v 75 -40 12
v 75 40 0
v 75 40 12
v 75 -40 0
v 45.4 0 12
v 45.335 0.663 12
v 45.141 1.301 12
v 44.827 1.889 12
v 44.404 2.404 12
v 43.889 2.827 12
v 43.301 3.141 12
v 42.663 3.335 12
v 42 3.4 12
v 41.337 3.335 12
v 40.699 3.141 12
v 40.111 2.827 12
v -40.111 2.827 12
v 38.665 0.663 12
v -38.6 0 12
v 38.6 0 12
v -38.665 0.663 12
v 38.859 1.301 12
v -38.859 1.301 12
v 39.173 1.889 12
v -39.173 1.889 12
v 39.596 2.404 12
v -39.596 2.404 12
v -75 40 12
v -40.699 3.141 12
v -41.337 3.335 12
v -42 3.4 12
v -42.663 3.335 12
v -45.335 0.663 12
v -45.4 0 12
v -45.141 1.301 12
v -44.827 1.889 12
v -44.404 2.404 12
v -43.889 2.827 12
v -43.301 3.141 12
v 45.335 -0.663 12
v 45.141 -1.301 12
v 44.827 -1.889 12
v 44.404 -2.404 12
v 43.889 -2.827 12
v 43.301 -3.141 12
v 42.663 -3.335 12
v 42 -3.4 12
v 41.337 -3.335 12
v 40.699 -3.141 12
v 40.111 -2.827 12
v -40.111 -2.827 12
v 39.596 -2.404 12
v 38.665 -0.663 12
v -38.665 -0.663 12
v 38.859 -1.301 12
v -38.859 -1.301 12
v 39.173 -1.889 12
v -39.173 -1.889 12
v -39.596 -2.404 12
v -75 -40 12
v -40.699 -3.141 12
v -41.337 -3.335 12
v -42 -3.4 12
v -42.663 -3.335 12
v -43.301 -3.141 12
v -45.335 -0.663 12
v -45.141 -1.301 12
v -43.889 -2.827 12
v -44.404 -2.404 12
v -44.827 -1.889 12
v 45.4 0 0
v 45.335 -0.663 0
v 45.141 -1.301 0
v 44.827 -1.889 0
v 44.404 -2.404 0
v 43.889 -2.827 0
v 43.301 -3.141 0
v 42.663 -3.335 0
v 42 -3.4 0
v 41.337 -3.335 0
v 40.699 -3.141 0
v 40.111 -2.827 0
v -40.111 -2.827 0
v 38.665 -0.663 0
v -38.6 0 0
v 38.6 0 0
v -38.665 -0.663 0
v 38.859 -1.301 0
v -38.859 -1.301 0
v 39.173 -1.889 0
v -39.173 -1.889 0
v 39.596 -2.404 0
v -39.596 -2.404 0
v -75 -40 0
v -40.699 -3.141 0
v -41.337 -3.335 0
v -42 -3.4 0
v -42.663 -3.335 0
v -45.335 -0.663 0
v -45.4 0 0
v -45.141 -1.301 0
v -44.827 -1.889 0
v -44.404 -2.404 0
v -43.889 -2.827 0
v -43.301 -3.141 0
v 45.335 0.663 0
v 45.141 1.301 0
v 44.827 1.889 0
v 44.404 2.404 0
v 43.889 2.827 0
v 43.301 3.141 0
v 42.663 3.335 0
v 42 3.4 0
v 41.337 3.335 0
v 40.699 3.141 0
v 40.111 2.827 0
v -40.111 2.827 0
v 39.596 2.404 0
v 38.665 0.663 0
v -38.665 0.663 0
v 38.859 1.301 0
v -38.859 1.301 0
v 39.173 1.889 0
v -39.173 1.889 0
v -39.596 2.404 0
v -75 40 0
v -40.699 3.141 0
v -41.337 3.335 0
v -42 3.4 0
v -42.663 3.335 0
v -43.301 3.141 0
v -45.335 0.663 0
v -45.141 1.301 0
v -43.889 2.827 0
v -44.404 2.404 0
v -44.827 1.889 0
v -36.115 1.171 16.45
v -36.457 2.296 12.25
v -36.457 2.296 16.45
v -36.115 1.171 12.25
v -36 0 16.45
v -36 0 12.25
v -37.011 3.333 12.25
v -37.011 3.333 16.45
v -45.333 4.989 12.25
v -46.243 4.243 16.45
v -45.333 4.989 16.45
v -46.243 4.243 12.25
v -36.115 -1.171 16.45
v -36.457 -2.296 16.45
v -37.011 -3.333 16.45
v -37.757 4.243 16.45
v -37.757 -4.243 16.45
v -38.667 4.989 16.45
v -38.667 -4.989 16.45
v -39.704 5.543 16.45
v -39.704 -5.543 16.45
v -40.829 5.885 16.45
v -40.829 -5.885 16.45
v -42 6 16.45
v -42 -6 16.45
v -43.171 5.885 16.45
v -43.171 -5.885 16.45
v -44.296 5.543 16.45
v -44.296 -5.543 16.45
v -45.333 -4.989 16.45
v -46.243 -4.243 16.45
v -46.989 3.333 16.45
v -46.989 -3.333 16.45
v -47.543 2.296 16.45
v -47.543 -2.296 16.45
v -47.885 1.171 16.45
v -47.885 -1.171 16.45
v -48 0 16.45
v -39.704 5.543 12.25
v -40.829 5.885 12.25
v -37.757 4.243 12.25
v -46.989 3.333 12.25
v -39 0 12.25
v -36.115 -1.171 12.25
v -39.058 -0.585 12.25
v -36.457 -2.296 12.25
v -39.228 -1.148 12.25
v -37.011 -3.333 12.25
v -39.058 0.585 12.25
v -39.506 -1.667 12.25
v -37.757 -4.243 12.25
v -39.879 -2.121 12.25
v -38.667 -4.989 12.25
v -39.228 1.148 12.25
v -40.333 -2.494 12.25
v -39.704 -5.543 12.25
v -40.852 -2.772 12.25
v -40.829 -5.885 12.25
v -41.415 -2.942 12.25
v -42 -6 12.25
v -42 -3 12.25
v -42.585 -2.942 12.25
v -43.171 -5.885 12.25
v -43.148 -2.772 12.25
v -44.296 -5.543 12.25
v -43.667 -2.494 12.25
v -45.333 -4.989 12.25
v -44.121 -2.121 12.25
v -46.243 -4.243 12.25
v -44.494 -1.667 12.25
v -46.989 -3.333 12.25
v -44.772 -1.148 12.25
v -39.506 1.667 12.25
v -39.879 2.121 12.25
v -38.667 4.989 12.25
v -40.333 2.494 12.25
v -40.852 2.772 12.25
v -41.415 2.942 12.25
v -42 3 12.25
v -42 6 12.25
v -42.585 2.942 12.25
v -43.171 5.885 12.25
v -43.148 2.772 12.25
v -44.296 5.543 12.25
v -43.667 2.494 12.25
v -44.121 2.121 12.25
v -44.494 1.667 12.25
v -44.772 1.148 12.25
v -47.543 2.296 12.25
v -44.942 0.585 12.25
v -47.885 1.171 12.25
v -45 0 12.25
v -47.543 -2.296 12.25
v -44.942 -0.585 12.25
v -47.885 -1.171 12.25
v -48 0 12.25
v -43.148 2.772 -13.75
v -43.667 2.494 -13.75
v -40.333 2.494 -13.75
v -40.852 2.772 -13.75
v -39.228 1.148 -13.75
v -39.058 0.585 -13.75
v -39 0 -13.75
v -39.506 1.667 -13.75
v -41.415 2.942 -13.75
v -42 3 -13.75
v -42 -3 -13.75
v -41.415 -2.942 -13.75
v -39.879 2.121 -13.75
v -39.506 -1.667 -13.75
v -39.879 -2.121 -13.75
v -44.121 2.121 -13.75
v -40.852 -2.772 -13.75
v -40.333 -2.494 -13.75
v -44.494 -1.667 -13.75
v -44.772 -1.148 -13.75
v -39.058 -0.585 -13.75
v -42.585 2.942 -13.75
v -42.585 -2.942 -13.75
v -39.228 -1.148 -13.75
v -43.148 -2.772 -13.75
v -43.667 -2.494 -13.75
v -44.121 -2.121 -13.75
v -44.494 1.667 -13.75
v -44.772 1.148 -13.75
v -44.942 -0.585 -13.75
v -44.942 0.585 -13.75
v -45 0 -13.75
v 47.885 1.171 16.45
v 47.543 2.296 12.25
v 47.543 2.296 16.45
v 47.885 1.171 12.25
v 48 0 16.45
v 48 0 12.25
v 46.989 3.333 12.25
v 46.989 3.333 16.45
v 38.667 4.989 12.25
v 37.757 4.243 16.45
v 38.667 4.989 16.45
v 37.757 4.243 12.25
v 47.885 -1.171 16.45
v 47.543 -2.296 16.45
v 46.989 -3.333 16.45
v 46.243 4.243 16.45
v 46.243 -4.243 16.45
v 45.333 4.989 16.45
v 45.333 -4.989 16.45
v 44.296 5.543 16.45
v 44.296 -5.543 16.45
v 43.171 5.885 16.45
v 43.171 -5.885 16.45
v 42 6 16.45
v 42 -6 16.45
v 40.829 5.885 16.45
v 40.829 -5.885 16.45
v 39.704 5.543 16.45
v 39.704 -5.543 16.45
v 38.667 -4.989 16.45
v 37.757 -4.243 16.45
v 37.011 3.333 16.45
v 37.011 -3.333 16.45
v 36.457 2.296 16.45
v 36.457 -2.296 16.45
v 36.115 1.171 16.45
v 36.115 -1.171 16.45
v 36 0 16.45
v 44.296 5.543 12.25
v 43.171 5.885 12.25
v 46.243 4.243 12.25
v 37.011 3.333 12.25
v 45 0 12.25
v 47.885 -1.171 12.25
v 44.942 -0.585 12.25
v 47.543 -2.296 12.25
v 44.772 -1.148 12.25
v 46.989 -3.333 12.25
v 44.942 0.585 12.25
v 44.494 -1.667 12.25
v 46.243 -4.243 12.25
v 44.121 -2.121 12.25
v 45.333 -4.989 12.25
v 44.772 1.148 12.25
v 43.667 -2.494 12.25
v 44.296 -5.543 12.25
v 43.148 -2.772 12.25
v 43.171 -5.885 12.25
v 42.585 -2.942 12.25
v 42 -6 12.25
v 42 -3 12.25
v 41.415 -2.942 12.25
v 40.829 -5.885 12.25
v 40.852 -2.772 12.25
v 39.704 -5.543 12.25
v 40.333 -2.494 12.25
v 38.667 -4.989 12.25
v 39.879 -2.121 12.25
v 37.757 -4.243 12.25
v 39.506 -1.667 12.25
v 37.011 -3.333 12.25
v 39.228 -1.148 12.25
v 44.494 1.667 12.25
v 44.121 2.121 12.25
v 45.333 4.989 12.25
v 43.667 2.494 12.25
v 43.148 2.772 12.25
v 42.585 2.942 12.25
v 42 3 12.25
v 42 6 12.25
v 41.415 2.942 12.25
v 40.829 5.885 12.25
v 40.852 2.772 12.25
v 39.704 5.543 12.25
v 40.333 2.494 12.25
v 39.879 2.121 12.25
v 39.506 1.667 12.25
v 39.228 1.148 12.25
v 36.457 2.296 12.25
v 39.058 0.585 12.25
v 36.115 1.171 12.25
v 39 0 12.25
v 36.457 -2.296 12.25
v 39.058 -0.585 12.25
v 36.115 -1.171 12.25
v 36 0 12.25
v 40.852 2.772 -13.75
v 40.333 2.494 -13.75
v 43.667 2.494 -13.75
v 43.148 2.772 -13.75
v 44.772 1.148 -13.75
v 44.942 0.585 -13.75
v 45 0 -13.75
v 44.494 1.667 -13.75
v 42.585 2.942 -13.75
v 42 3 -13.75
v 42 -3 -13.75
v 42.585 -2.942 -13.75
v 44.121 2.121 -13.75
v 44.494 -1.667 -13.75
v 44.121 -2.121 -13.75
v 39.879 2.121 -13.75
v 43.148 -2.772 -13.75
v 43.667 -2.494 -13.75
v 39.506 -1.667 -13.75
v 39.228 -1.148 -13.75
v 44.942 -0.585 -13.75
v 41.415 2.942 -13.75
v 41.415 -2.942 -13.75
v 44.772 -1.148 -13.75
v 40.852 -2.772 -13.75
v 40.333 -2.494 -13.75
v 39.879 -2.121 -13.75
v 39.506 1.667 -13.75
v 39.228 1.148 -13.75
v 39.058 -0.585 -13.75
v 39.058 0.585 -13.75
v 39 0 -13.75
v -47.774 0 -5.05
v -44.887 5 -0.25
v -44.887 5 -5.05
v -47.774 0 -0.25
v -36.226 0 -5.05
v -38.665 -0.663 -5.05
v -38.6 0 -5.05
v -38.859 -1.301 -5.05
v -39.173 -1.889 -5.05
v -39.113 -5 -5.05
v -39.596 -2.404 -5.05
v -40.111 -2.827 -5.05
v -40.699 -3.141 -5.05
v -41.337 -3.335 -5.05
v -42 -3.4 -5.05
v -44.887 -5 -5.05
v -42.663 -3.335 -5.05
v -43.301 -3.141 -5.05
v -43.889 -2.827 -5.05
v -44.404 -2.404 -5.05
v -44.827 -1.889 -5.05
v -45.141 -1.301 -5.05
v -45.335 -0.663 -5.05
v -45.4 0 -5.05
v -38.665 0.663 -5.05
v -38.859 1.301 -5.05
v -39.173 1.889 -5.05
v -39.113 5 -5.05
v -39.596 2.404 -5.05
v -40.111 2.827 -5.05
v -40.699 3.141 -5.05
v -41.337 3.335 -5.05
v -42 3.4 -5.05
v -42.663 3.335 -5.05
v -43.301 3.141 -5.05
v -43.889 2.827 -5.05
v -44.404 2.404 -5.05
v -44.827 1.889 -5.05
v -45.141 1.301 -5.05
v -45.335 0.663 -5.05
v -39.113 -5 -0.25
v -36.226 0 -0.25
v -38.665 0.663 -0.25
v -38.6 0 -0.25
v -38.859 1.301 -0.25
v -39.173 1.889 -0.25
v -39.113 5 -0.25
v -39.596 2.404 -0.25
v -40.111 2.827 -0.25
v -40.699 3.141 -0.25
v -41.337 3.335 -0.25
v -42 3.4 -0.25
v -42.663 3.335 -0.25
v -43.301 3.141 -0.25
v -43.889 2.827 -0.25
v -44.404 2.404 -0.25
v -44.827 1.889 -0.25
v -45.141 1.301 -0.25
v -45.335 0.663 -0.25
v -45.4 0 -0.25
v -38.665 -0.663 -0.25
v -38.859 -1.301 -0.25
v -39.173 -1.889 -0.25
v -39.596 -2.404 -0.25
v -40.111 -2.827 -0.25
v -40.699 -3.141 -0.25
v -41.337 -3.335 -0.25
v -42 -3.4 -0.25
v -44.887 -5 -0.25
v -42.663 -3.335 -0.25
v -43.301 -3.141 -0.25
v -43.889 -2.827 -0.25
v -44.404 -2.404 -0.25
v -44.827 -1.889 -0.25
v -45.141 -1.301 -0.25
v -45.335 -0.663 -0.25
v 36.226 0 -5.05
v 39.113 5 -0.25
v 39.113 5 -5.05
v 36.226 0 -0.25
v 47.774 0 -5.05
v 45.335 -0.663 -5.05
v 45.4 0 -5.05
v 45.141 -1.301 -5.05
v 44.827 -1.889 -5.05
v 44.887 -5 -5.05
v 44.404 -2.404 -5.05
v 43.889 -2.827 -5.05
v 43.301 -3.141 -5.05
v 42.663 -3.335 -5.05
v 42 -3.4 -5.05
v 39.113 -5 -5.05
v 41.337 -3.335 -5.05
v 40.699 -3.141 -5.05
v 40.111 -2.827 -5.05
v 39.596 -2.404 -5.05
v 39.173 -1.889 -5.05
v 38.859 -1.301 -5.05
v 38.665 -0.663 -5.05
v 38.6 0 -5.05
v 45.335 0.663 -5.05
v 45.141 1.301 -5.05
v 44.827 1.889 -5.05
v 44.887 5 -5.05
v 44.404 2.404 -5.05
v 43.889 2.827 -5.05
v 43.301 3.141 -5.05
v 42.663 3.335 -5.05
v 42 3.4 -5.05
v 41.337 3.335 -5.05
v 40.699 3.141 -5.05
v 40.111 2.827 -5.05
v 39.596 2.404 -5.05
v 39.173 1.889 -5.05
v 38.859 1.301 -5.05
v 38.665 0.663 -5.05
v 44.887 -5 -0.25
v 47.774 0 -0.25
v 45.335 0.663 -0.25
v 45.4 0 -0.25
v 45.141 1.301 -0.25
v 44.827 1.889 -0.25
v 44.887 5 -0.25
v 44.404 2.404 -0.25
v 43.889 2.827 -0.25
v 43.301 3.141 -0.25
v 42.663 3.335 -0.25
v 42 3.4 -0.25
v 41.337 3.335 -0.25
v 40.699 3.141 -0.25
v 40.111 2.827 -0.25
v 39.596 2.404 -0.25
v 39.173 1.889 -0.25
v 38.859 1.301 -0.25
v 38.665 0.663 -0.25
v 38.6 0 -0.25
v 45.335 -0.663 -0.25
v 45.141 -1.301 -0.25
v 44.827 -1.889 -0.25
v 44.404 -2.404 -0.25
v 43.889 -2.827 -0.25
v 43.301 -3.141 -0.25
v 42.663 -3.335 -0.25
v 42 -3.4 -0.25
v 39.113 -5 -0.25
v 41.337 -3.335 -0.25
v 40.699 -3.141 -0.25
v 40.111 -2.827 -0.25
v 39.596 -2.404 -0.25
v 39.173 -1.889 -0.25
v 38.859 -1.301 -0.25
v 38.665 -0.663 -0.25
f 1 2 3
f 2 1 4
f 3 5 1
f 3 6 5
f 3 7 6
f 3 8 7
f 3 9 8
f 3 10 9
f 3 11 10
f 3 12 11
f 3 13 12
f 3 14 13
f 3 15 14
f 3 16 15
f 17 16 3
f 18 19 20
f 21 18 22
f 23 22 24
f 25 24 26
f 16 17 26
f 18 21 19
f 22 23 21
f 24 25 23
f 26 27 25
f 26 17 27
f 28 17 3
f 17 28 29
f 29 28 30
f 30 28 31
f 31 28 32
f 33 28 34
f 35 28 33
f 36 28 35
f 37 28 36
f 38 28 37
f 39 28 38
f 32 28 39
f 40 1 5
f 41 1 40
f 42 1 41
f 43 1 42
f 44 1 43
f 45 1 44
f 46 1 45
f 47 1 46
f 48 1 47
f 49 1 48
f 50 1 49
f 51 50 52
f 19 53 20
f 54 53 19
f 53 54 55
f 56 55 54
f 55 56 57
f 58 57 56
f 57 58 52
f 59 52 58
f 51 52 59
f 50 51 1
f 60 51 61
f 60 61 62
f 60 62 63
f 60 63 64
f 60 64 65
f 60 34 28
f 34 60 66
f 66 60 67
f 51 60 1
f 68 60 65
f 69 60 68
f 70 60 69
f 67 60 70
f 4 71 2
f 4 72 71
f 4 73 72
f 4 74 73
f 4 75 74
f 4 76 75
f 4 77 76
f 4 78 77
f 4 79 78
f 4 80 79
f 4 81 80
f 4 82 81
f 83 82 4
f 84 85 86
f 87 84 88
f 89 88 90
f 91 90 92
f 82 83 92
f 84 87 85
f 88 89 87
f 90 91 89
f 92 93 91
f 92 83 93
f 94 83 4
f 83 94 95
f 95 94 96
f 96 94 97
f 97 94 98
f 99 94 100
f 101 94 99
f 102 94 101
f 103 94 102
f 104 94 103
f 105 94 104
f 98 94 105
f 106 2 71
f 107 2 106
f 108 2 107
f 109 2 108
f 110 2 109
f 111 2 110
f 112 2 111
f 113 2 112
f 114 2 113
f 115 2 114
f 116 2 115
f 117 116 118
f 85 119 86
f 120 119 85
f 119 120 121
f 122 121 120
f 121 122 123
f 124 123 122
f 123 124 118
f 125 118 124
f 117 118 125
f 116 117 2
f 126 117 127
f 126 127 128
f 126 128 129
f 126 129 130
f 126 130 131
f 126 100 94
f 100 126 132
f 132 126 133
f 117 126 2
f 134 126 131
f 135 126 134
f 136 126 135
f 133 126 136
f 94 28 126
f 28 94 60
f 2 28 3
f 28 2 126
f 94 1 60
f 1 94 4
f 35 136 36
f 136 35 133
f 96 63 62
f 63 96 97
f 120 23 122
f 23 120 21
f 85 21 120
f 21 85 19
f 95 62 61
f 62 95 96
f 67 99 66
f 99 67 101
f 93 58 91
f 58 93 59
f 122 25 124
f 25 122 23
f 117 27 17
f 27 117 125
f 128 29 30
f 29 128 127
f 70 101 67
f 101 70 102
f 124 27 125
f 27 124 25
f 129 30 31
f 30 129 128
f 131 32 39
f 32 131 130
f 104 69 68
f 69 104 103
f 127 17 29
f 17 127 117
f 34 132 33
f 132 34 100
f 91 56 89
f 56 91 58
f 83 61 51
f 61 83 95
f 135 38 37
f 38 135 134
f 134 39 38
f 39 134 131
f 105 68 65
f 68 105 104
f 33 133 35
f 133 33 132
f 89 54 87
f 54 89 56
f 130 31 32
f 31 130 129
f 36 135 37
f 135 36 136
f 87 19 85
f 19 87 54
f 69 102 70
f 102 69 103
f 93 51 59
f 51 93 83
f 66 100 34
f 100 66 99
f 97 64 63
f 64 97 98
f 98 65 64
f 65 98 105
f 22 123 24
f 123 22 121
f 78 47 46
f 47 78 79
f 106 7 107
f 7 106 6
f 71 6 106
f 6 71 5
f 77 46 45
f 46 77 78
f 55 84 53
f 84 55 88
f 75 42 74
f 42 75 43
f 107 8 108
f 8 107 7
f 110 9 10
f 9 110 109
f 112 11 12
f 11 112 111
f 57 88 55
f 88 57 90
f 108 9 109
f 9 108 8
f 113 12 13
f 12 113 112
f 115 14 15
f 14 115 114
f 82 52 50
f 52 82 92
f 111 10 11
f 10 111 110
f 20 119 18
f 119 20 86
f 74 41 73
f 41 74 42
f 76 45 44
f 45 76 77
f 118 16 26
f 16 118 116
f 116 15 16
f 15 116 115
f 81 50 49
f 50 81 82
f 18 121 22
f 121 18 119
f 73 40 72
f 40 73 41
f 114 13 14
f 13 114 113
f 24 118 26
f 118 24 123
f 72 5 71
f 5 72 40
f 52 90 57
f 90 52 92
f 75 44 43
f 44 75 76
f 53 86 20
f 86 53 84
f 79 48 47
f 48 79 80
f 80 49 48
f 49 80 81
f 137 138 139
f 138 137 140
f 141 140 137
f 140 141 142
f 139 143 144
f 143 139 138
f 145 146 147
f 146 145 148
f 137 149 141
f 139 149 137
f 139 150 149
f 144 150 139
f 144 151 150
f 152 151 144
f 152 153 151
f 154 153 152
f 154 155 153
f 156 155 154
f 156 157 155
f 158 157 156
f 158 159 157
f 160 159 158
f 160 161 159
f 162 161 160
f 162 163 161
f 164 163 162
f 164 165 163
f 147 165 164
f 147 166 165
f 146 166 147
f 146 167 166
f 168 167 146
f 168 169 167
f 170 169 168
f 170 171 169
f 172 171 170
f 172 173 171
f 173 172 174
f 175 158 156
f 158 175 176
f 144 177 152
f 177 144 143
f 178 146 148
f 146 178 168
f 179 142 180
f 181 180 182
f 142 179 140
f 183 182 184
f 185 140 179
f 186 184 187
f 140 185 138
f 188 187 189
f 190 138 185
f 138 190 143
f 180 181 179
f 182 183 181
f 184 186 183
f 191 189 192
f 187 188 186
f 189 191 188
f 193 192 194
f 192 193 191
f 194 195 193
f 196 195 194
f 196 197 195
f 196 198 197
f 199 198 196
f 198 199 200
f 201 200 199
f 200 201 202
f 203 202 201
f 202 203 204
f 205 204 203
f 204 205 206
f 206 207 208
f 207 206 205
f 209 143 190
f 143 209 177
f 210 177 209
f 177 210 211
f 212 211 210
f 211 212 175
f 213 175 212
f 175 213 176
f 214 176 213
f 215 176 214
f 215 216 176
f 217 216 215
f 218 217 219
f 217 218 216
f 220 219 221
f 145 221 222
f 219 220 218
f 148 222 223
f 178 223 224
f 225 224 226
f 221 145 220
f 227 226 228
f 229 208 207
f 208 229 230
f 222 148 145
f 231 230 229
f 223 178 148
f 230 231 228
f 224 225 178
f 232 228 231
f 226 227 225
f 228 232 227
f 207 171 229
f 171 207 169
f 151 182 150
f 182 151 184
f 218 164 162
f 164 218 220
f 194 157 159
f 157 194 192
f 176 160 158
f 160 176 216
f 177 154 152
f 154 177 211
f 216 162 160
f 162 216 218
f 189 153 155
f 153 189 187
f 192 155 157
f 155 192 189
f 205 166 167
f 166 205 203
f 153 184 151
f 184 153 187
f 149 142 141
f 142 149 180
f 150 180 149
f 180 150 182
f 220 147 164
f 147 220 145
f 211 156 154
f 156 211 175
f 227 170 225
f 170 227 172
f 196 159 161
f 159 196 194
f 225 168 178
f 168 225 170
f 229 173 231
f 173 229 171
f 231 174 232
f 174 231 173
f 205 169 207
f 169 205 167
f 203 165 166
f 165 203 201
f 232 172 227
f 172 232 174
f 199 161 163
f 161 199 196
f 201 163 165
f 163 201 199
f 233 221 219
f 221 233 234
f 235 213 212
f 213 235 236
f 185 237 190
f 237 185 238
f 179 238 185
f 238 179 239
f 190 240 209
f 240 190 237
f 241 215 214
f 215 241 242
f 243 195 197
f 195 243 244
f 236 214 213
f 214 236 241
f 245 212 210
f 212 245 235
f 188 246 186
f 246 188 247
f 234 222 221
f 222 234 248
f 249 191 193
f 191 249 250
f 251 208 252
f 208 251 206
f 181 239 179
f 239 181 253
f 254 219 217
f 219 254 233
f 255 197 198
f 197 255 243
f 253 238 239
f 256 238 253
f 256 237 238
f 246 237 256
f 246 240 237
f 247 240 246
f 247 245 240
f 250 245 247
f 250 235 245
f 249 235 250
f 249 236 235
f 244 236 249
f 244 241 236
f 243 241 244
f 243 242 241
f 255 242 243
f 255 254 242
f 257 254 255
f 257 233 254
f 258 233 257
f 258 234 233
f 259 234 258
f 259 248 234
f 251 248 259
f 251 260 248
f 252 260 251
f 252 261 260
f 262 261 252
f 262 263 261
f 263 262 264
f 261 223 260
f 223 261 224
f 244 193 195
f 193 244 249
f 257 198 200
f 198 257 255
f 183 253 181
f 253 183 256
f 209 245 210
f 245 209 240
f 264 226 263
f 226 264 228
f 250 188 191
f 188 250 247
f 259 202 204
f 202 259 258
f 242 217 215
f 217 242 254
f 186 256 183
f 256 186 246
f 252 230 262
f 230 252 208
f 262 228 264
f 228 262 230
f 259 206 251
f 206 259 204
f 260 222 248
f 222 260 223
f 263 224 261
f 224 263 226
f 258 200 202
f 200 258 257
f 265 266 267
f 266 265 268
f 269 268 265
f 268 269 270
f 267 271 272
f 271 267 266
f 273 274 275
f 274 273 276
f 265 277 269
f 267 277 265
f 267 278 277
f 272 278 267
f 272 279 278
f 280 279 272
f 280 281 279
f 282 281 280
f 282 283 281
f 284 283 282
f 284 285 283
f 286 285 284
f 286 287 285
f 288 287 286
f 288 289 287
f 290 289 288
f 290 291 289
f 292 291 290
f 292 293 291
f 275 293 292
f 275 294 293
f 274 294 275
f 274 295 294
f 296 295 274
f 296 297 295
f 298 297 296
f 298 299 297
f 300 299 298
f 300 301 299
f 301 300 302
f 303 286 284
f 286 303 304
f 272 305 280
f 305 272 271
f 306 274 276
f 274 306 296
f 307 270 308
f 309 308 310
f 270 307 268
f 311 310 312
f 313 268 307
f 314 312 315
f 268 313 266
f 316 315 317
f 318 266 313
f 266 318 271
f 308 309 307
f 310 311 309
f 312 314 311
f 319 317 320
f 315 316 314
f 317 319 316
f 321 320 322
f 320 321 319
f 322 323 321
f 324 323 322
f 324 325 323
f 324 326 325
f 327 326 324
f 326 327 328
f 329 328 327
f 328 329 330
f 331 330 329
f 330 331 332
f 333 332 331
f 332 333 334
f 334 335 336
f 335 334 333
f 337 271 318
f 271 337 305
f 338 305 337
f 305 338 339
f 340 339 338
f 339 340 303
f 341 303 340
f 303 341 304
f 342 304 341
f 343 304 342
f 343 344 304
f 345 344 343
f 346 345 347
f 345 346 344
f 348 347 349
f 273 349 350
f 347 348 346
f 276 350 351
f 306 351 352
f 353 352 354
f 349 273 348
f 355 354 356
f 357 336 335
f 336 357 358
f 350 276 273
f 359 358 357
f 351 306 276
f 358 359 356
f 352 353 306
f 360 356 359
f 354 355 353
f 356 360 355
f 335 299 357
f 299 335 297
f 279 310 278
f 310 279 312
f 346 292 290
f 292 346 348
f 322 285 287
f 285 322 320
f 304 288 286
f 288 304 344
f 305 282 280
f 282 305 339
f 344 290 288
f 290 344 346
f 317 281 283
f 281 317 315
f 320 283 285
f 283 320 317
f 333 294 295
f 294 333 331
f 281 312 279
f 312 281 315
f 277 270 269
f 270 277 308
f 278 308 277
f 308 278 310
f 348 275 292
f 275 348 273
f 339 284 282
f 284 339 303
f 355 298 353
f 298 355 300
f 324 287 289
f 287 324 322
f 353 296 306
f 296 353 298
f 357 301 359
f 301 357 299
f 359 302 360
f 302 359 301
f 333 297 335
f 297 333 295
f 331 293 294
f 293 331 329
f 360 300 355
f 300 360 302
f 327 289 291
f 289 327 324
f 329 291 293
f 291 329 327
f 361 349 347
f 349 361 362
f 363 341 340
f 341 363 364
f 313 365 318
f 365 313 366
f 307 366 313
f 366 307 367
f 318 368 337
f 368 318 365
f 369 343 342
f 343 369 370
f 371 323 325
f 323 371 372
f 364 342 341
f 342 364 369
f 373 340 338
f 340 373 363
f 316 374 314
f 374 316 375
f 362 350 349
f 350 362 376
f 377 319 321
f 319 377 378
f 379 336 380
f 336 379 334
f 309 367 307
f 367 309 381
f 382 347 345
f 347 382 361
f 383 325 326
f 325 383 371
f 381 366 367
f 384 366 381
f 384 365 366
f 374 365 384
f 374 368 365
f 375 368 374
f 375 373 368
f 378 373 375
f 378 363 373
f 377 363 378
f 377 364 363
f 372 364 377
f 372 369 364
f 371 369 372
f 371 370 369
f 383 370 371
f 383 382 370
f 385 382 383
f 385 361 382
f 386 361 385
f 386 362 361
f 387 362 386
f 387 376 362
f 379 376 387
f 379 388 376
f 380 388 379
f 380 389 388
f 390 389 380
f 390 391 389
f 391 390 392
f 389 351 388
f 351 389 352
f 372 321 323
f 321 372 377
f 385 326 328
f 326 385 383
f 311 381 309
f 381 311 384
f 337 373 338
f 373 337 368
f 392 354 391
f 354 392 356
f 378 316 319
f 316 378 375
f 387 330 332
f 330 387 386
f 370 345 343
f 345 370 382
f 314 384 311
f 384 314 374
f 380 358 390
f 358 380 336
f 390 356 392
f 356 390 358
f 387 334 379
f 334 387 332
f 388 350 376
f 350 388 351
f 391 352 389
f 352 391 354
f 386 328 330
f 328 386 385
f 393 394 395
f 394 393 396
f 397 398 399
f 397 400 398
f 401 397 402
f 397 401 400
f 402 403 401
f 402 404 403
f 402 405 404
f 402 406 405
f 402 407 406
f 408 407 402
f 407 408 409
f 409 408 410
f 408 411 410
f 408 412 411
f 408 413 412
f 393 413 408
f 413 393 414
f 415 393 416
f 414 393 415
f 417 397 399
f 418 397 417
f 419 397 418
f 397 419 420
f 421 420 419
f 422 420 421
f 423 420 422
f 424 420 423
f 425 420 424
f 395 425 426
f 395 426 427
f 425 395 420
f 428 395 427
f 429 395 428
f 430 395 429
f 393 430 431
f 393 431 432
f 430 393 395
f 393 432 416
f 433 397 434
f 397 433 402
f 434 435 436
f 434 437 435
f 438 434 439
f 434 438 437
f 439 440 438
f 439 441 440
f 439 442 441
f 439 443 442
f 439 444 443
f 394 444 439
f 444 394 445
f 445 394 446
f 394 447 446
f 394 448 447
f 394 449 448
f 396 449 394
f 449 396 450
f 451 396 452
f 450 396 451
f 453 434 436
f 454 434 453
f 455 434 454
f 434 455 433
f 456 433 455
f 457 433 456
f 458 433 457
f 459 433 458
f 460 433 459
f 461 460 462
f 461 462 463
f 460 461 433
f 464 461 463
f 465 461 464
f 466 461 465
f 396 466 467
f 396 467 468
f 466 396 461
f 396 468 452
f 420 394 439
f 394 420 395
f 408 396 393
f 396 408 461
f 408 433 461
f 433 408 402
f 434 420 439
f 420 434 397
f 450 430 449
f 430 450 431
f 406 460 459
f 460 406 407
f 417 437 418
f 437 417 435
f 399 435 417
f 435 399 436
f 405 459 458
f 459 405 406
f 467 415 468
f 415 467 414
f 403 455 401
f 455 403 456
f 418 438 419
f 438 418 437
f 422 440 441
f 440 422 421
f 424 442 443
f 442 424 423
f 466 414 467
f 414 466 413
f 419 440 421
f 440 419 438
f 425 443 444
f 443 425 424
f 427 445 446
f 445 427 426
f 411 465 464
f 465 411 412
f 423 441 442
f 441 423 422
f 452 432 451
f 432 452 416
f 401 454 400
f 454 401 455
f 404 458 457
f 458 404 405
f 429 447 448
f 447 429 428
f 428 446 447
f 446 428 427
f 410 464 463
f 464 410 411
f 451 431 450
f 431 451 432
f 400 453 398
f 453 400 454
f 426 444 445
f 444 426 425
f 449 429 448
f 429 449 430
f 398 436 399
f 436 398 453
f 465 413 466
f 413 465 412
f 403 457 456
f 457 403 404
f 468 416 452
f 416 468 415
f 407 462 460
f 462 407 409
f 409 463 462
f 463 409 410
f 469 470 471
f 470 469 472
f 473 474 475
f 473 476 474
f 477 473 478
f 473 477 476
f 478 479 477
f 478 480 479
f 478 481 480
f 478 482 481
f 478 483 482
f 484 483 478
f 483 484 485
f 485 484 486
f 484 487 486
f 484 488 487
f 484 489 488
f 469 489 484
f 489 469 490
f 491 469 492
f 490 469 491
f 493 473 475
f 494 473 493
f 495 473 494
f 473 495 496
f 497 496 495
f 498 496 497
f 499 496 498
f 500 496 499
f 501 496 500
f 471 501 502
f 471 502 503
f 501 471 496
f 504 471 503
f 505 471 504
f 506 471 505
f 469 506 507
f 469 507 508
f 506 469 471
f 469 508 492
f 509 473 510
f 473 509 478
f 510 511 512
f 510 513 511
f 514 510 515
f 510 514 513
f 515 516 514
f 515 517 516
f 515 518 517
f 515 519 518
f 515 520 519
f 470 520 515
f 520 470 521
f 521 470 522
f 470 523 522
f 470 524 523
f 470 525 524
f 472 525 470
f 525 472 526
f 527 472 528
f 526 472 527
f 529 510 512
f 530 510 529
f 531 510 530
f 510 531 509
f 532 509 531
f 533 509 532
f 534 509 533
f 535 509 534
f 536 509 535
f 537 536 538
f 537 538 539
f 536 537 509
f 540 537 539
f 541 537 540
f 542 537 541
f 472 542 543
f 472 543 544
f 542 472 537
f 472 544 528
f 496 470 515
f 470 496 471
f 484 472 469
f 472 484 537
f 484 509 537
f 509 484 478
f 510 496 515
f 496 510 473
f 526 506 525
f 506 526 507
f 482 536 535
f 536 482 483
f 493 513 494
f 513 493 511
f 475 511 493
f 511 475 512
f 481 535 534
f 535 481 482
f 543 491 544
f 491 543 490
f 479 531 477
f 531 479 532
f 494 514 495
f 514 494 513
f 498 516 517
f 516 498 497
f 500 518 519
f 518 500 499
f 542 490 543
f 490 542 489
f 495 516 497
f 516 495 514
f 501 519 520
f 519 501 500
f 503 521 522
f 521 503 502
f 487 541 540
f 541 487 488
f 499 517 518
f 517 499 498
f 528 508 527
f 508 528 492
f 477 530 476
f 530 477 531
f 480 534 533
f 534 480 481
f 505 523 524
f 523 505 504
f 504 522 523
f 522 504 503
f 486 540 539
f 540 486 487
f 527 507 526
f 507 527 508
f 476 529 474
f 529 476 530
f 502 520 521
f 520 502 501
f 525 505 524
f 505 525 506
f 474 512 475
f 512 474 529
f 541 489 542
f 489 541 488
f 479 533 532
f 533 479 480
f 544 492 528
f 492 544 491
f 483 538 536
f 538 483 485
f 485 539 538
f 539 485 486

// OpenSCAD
$fn = 32;

// ------------------------------------------------------------------------
// Bolted plate: 150 x 80 x 12 mm plate, 2 fasteners
// Every part is its own module, assembly() places them once.
// ------------------------------------------------------------------------

// --- part 1 ---
module plate() {
  difference() {
    translate([-75, -40, 0]) cube([150, 80, 12]);
    translate([-42, 0, -1]) cylinder(h = 14, d = 6.8);
    translate([42, 0, -1]) cylinder(h = 14, d = 6.8);
  }
}

// --- part 2 ---
module bolt1() {
  cylinder(h = 4.2, d = 12);
  translate([0, 0, -26]) cylinder(h = 26, d = 6);
}

// --- part 3 ---
module bolt2() {
  cylinder(h = 4.2, d = 12);
  translate([0, 0, -26]) cylinder(h = 26, d = 6);
}

// --- part 4 ---
module nut1() {
  difference() {
    linear_extrude(height = 4.8) polygon(points = [[5.774, 0], [2.887, 5], [-2.887, 5], [-5.774, 0], [-2.887, -5], [2.887, -5]]);
    translate([0, 0, -1]) cylinder(h = 6.8, d = 6.8);
  }
}

// --- part 5 ---
module nut2() {
  difference() {
    linear_extrude(height = 4.8) polygon(points = [[5.774, 0], [2.887, 5], [-2.887, 5], [-5.774, 0], [-2.887, -5], [2.887, -5]]);
    translate([0, 0, -1]) cylinder(h = 6.8, d = 6.8);
  }
}

// --- assembly ---
module assembly() {
  translate([0, 0, 0]) rotate([0, 0, 0]) plate();
  translate([-42, 0, 12.25]) rotate([0, 0, 0]) bolt1();
  translate([42, 0, 12.25]) rotate([0, 0, 0]) bolt2();
  translate([-42, 0, -5.05]) rotate([0, 0, 0]) nut1();
  translate([42, 0, -5.05]) rotate([0, 0, 0]) nut2();
}

assembly();
